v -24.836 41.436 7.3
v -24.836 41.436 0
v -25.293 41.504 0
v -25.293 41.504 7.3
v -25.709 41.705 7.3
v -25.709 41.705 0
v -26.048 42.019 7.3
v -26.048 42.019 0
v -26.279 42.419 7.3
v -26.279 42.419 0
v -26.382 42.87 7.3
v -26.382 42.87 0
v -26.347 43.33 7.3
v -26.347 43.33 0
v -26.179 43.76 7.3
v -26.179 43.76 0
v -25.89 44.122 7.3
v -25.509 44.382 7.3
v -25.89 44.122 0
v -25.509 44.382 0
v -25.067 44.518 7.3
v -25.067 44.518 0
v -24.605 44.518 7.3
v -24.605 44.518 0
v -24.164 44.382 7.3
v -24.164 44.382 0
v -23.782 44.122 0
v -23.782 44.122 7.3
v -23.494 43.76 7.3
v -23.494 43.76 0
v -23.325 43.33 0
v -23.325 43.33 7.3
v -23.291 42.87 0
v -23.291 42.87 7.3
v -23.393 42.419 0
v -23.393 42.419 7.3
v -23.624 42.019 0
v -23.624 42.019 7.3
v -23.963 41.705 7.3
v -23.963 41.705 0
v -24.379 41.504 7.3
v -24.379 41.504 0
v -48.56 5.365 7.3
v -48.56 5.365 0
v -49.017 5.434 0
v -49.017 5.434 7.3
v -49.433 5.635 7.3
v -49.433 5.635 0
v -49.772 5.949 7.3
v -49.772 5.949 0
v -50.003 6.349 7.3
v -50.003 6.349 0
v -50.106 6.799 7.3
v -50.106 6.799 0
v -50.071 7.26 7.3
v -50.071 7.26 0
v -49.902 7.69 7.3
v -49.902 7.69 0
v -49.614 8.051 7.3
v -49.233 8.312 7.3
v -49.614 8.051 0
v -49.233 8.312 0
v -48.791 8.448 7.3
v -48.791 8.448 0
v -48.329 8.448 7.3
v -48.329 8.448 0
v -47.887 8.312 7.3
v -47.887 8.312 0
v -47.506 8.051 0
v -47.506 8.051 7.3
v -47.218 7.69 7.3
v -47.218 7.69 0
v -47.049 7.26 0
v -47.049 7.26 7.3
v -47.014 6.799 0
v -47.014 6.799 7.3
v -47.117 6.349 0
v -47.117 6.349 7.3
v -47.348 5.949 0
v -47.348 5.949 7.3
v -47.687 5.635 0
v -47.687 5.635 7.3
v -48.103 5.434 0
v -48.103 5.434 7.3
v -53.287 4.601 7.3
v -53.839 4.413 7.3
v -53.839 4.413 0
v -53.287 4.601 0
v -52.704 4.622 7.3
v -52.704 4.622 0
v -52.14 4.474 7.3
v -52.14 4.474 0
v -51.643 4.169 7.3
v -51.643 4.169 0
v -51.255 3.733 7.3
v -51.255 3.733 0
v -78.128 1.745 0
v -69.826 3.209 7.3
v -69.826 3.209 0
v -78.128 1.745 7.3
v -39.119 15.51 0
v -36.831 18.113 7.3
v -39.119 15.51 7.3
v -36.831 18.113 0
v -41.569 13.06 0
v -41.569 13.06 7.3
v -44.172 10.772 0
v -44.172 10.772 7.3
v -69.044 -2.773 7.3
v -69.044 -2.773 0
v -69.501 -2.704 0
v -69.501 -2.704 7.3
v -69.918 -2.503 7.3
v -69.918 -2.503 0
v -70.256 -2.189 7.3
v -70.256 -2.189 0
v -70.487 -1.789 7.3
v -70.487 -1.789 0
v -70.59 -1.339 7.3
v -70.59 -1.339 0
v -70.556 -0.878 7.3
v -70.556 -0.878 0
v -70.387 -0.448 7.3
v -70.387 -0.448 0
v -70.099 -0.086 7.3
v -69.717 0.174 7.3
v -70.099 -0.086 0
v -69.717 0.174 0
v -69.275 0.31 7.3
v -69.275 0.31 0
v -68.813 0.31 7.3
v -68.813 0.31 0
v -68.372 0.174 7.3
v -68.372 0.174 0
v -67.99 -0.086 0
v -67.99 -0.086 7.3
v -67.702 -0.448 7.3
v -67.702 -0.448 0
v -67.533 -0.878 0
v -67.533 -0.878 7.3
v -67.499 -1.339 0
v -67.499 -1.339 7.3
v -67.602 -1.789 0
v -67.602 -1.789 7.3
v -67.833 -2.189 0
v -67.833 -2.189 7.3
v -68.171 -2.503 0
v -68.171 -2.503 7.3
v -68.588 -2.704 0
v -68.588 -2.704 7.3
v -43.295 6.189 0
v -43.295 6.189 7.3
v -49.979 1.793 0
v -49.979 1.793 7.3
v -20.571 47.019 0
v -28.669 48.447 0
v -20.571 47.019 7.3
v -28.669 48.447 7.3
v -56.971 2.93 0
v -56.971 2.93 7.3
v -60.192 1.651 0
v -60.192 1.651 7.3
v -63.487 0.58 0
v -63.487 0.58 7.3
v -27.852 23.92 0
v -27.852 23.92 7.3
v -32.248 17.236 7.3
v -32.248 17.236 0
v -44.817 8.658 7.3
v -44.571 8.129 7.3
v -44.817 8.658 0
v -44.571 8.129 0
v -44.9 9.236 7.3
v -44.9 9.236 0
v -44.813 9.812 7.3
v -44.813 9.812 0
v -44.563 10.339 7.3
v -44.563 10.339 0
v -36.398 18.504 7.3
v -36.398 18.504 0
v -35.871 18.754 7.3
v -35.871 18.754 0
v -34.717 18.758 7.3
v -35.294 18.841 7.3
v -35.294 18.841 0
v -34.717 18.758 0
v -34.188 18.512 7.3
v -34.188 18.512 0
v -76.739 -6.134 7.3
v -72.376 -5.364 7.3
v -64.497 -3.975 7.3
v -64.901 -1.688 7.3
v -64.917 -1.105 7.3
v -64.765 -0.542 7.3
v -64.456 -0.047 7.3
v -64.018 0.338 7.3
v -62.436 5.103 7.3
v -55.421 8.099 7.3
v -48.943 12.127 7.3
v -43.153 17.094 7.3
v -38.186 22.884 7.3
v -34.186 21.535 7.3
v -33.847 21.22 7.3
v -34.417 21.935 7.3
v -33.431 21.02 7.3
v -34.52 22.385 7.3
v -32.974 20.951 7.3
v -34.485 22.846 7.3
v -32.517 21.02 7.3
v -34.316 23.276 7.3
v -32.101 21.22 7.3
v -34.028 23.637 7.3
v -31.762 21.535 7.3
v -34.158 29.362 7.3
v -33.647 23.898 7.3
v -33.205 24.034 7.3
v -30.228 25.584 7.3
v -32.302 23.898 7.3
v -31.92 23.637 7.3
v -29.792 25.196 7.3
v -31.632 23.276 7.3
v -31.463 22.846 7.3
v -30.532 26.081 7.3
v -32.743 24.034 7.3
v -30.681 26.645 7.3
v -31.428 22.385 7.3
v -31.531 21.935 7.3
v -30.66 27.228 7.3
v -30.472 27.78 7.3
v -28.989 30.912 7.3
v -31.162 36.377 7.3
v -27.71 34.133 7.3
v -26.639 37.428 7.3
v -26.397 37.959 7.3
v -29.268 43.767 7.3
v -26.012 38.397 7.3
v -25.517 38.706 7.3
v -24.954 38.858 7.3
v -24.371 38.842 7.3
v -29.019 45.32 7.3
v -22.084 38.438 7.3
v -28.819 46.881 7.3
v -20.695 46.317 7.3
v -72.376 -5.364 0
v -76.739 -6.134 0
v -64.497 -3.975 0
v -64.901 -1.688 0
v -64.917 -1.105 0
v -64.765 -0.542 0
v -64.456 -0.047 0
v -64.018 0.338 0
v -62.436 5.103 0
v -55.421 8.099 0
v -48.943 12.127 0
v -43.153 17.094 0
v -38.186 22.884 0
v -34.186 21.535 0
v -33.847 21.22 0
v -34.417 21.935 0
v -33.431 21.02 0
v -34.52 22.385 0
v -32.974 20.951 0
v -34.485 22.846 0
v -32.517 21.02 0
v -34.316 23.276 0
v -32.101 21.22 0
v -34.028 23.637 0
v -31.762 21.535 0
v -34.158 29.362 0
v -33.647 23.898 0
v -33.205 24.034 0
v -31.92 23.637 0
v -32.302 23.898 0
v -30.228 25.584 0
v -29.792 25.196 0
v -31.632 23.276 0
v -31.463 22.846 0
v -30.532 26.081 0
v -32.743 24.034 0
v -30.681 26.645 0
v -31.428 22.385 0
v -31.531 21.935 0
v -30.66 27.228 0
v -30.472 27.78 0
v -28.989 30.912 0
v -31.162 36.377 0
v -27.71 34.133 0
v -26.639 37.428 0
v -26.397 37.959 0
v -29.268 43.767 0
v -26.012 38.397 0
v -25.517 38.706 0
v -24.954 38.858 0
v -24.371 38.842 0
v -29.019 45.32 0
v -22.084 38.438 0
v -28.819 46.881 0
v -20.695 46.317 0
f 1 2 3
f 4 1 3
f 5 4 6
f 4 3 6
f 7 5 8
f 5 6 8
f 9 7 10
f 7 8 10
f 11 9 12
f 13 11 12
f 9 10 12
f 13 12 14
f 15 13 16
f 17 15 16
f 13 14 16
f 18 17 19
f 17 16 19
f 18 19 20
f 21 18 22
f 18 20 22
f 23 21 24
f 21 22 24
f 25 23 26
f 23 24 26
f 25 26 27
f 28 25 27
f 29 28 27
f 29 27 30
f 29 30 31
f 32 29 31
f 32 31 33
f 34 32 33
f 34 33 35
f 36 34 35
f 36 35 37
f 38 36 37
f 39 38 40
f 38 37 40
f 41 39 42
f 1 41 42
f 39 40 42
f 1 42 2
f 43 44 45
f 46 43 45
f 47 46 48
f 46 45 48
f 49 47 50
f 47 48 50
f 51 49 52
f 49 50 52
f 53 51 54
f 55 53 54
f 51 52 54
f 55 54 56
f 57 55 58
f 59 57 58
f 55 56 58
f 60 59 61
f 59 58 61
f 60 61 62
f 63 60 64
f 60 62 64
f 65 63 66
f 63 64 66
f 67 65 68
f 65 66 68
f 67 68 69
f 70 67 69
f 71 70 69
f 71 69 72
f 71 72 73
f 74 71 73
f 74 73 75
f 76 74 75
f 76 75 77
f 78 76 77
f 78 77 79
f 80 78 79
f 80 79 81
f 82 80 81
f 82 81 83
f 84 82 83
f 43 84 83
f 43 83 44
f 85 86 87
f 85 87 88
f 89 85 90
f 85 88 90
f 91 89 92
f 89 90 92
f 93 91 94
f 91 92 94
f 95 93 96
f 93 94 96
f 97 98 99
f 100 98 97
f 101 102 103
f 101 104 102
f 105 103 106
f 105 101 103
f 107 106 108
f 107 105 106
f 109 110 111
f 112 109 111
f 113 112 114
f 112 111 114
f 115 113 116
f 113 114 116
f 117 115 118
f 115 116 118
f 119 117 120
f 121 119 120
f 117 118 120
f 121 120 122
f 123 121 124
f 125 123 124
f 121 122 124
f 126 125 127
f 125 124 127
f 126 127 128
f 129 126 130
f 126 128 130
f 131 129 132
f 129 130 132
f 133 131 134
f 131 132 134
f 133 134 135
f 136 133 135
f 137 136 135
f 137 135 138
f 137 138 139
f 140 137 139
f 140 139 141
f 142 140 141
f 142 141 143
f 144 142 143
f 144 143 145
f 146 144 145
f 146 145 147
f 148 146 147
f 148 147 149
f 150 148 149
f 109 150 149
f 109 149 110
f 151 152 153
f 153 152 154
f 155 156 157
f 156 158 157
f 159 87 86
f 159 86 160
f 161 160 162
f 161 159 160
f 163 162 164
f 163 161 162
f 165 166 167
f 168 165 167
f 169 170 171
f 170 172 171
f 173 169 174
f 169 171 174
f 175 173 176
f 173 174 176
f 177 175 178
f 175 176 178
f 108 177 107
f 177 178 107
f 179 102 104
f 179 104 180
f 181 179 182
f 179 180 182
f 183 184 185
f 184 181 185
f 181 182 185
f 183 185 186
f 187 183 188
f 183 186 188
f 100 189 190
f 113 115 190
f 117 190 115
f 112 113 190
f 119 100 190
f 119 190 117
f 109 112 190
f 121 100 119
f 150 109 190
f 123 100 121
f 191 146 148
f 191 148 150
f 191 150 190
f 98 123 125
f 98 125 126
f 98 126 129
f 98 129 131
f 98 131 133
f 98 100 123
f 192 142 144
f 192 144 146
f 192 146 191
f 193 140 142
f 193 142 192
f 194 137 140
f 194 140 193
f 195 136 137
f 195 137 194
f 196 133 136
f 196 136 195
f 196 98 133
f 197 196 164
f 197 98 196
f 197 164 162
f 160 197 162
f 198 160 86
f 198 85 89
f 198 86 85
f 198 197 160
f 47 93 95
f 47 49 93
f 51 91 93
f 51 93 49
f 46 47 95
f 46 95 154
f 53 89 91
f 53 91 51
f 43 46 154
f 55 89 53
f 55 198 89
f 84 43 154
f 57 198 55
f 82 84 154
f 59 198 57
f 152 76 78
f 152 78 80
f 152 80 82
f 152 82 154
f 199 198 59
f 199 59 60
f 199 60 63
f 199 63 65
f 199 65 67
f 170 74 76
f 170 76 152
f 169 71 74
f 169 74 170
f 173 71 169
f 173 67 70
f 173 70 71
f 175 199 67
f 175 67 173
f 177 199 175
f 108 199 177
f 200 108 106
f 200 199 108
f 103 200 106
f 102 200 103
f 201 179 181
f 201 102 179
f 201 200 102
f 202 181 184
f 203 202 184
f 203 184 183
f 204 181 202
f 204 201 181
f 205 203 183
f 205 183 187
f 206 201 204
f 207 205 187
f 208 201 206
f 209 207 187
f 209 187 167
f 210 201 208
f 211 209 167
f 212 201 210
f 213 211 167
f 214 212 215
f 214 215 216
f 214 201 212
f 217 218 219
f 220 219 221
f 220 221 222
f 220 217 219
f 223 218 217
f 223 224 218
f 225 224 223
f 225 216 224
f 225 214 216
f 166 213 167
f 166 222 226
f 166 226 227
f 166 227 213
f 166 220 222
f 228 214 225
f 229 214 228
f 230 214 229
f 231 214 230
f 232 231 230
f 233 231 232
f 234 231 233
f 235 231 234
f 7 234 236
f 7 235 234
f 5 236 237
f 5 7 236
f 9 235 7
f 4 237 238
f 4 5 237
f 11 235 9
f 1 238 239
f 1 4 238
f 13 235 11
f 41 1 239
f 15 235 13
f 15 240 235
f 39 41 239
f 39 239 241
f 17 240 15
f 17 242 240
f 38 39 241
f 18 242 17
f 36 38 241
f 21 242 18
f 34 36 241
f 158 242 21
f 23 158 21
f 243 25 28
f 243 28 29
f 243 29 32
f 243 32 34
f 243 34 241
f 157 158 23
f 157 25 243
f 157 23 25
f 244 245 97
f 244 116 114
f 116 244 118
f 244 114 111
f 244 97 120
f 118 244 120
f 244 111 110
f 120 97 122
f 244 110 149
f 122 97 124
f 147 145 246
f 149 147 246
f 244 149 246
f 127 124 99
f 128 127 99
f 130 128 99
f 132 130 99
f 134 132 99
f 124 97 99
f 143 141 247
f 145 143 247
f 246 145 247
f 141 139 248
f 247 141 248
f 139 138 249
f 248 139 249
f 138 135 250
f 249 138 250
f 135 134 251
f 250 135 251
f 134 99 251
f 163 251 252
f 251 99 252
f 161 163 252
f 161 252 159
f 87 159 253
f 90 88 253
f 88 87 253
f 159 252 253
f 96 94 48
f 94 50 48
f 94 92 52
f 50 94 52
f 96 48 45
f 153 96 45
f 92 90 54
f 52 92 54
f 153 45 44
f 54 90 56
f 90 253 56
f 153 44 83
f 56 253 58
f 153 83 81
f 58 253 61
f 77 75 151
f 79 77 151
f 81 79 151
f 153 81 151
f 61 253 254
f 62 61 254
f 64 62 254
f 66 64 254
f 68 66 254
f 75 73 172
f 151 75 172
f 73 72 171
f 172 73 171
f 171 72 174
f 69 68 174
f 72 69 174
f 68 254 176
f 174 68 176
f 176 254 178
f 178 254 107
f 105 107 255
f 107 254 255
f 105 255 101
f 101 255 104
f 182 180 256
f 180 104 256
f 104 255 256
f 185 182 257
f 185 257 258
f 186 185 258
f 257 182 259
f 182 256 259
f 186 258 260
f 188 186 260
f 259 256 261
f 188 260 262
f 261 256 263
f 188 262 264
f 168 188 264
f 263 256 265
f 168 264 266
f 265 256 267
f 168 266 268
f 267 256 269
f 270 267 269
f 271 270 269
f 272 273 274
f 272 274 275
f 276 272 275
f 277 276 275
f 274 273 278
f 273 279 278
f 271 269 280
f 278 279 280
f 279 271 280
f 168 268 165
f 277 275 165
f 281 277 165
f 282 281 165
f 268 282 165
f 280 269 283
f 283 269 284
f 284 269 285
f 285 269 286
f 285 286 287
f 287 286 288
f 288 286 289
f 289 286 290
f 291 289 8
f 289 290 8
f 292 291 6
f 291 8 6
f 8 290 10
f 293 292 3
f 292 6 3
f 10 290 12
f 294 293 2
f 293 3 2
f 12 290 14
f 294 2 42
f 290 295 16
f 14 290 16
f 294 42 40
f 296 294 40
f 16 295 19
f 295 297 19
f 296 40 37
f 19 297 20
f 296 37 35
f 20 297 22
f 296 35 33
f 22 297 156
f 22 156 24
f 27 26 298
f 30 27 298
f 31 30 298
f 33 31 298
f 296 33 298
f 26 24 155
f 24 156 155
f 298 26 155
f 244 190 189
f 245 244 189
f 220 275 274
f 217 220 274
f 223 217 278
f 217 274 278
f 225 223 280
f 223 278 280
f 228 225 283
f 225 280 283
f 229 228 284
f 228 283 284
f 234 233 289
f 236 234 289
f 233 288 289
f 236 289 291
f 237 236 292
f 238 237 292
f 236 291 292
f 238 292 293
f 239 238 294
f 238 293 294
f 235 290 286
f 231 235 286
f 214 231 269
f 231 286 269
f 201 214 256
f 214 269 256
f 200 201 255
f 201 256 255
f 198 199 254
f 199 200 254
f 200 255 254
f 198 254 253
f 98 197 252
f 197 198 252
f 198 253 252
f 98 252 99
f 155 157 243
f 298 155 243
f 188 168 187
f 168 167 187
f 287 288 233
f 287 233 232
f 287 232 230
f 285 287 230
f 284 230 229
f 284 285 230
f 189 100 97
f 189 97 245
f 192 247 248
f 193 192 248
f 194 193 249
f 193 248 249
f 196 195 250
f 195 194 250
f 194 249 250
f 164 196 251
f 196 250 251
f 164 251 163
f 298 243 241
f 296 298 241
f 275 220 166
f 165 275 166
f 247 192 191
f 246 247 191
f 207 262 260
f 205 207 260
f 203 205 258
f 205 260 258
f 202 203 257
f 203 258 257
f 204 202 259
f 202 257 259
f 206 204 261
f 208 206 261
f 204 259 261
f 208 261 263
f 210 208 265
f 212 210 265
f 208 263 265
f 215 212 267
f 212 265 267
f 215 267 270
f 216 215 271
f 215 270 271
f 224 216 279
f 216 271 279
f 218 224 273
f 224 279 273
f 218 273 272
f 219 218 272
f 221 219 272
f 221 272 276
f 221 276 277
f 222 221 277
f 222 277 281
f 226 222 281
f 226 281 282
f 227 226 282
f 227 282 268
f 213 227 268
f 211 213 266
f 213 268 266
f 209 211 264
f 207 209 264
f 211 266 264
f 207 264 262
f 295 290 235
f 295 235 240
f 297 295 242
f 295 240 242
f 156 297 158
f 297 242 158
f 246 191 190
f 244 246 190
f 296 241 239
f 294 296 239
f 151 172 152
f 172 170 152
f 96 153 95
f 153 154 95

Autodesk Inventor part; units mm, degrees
ref_plane "YZ Plane" through (0, 0, 0) normal (1, 0, 0) x (0, 1, 0)
ref_plane "XZ Plane" through (0, 0, 0) normal (0, 1, 0) x (-1, 0, 0)
ref_plane "XY Plane" through (0, 0, 0) normal (0, 0, 1) x (1, 0, 0)
sketch "Sketch1" plane through (0, 0, 0) normal (0, 0, 1) x (1, 0, 0)
  circle A0 centre (-48.56, 6.9152) radius 2.1 projected
  circle A1 centre (-32.9741, 22.501) radius 2.1 projected
  circle A2 centre (-69.0444, -1.2227) radius 2.1 projected
  circle A3 centre (-24.8362, 42.9855) radius 2.1 projected
  circle A4 centre (-46.3856, -8.3913) radius 8 projected
  line L0 (-28.6687, 48.4472) -> (-17.4995, 54.7179) projected
  arc A5 (-69.8258, 3.2089) -> (-28.6687, 48.4472) centre (-78.5082, 52.4493) ccw projected
  line L1 (-69.8258, 3.2089) -> (-78.128, 1.745) projected
  line L2 (-78.128, 1.745) -> (-74.0482, -21.3924) projected
  line L3 (-74.0482, -21.3924) -> (-70.3922, -20.7477) projected
  arc A6 (-70.3922, -20.7477) -> (-49.7861, -35.1763) centre (-46.3856, -8.3913) ccw projected
  line L4 (-49.7861, -35.1763) -> (-49.1414, -38.8323) projected
  line L5 (-49.1414, -38.8323) -> (-41.263, -37.4431) projected
  line L6 (-41.263, -37.4431) -> (4.3164, -53.3072) projected
  line L7 (4.3164, -53.3072) -> (1.8974, -59.9532) projected
  line L8 (1.8974, -59.9532) -> (17.5702, -63.2237) projected
  arc A7 (17.5702, -63.2237) -> (22.7521, -63.408) centre (22.2724, -3.9734) ccw projected
  line L9 (22.7521, -63.408) -> (22.7442, -62.4373) projected
  arc A8 (24.6597, -60.4229) -> (22.7442, -62.4373) centre (24.7442, -62.4211) ccw projected
  arc A9 (24.6597, -60.4229) -> (33.3265, -59.3815) centre (22.2724, -3.9734) ccw projected
  arc A10 (35.6646, -60.8847) -> (33.3265, -59.3815) centre (33.7178, -61.3428) ccw projected
  line L10 (35.6646, -60.8847) -> (35.9706, -62.1851) projected
  arc A11 (35.9706, -62.1851) -> (41.9803, -60.4344) centre (22.2724, -3.9734) ccw projected
  line L11 (41.9803, -60.4344) -> (52.856, -55.363) projected
  arc A12 (52.856, -55.363) -> (58.0602, -51.8846) centre (22.2724, -3.9734) ccw projected
  line L12 (58.0602, -51.8846) -> (57.2607, -50.8143) projected
  arc A13 (57.6121, -48.0569) -> (57.2607, -50.8143) centre (58.863, -49.6174) ccw projected
  arc A14 (57.6121, -48.0569) -> (63.9808, -42.0872) centre (22.2724, -3.9734) ccw projected
  arc A15 (66.7551, -41.9147) -> (63.9808, -42.0872) centre (65.4572, -43.4363) ccw projected
  line L13 (66.7551, -41.9147) -> (67.4937, -42.5447) projected
  arc A16 (67.4937, -42.5447) -> (70.6833, -38.4566) centre (22.2724, -3.9734) ccw projected
  line L14 (70.6833, -38.4566) -> (78.2523, -24.3484) projected
  line L15 (78.2523, -24.3484) -> (71.6063, -21.9294) projected
  arc A17 (71.6063, -21.9294) -> (67.7387, 22.2766) centre (22.2724, -3.9734) ccw projected
  line L16 (67.7387, 22.2766) -> (73.8637, 25.8129) projected
  line L17 (73.8637, 25.8129) -> (63.9599, 38.3925) projected
  arc A18 (63.9599, 38.3925) -> (60.1088, 41.8646) centre (22.2724, -3.9734) ccw projected
  line L18 (60.1088, 41.8646) -> (59.4908, 41.1159) projected
  arc A19 (56.7287, 40.804) -> (59.4908, 41.1159) centre (57.9484, 42.389) ccw projected
  arc A20 (56.7287, 40.804) -> (49.4201, 45.5771) centre (22.2724, -3.9734) ccw projected
  arc A21 (48.5953, 48.2316) -> (49.4201, 45.5771) centre (50.3811, 47.3311) ccw projected
  line L19 (48.5953, 48.2316) -> (49.1968, 49.4245) projected
  arc A22 (49.1968, 49.4245) -> (43.4677, 51.9463) centre (22.2724, -3.9734) ccw projected
  line L20 (43.4677, 51.9463) -> (31.8766, 55.0521) projected
  arc A23 (31.8766, 55.0521) -> (25.6541, 55.7327) centre (22.2724, -3.9734) ccw projected
  line L21 (25.6541, 55.7327) -> (25.5786, 54.3989) projected
  arc A24 (23.537, 52.5125) -> (25.5786, 54.3989) centre (23.5818, 54.512) ccw projected
  arc A25 (23.537, 52.5125) -> (14.821, 52.0331) centre (22.2724, -3.9734) ccw projected
  arc A26 (12.5849, 53.6843) -> (14.821, 52.0331) centre (14.5573, 54.0157) ccw projected
  line L22 (12.5849, 53.6843) -> (12.4241, 54.6417) projected
  arc A27 (12.4241, 54.6417) -> (7.3529, 53.5603) centre (22.2724, -3.9734) ccw projected
  line L23 (7.3529, 53.5603) -> (-7.5139, 47.618) projected
  line L24 (-7.5139, 47.618) -> (-17.4995, 54.7179) projected
  circle A28 centre (-71.296, -16.8454) radius 1.5 projected
  circle A29 centre (18.8152, -59.8032) radius 1.5 projected
  circle A30 centre (53.4562, -50.8504) radius 1.5 projected
  circle A31 centre (60.8075, 36.5725) radius 1.5 projected
  circle A32 centre (28.5162, 51.9811) radius 1.5 projected
  circle A33 centre (9.173, 50.4079) radius 1.5 projected
  circle A34 centre (44.8423, 47.6065) radius 1.5 projected
  circle A35 centre (67.2628, -37.2117) radius 1.5 projected
  circle A36 centre (38.1378, -57.9935) radius 1.5 projected
  circle A37 centre (-45.81, -34.6909) radius 1.5 projected
  circle A38 centre (22.2724, -3.9734) radius 32.5 projected
  circle A39 centre (-78.5082, 52.4493) radius 5.9 projected
  circle A40 centre (-78.5082, 52.4493) radius 50
  circle A41 centre (-78.5082, 52.4493) radius 54
  line L25 (-78.5082, 52.4493) -> (-69.0444, -1.2227)
  line L26 (-78.5082, 52.4493) -> (-24.8362, 42.9855)
  point P0 (0, 0)
  point P1 (-25.3286, 43.0723)
  point P2 (-29.2678, 43.7669)
  point P3 (-69.1312, -0.7303)
  dimension "d0" = 100
  dimension "d1" = 108
extrude "Extrusion1" add sketch "Sketch1" along normal blind 7.3 contours A41 A0 | A0 A41 A2 L25 A5 L26 A3 A1 | A1 A41 | A41 L25 A2 | A3 L26 A41 picked at (-49.1962, 7.731) picked at (-33.8814, 22.9981) picked at (-68.8495, -0.1546) picked at (-25.9043, 42.7906)
sketch "Sketch2" plane through (0, 0, 7.3) normal (0, 0, 1) x (1, 0, 0)
  circle A0 centre (-48.56, 6.9152) radius 2.1 projected
  circle A1 centre (-32.9741, 22.501) radius 2.1 projected
  circle A2 centre (-69.0444, -1.2227) radius 2.1 projected
  circle A3 centre (-24.8362, 42.9855) radius 2.1 projected
  circle A4 centre (-46.3856, -8.3913) radius 8 projected
  line L0 (-28.6687, 48.4472) -> (-17.4995, 54.7179) projected
  arc A5 (-69.8258, 3.2089) -> (-28.6687, 48.4472) centre (-78.5082, 52.4493) ccw projected
  line L1 (-69.8258, 3.2089) -> (-78.128, 1.745) projected
  line L2 (-78.128, 1.745) -> (-74.0482, -21.3924) projected
  line L3 (-74.0482, -21.3924) -> (-70.3922, -20.7477) projected
  arc A6 (-70.3922, -20.7477) -> (-49.7861, -35.1763) centre (-46.3856, -8.3913) ccw projected
  line L4 (-49.7861, -35.1763) -> (-49.1414, -38.8323) projected
  line L5 (-49.1414, -38.8323) -> (-41.263, -37.4431) projected
  line L6 (-41.263, -37.4431) -> (4.3164, -53.3072) projected
  line L7 (4.3164, -53.3072) -> (1.8974, -59.9532) projected
  line L8 (1.8974, -59.9532) -> (17.5702, -63.2237) projected
  arc A7 (17.5702, -63.2237) -> (22.7521, -63.408) centre (22.2724, -3.9734) ccw projected
  line L9 (22.7521, -63.408) -> (22.7442, -62.4373) projected
  arc A8 (24.6597, -60.4229) -> (22.7442, -62.4373) centre (24.7442, -62.4211) ccw projected
  arc A9 (24.6597, -60.4229) -> (33.3265, -59.3815) centre (22.2724, -3.9734) ccw projected
  arc A10 (35.6646, -60.8847) -> (33.3265, -59.3815) centre (33.7178, -61.3428) ccw projected
  line L10 (35.6646, -60.8847) -> (35.9706, -62.1851) projected
  arc A11 (35.9706, -62.1851) -> (41.9803, -60.4344) centre (22.2724, -3.9734) ccw projected
  line L11 (41.9803, -60.4344) -> (52.856, -55.363) projected
  arc A12 (52.856, -55.363) -> (58.0602, -51.8846) centre (22.2724, -3.9734) ccw projected
  line L12 (58.0602, -51.8846) -> (57.2607, -50.8143) projected
  arc A13 (57.6121, -48.0569) -> (57.2607, -50.8143) centre (58.863, -49.6174) ccw projected
  arc A14 (57.6121, -48.0569) -> (63.9808, -42.0872) centre (22.2724, -3.9734) ccw projected
  arc A15 (66.7551, -41.9147) -> (63.9808, -42.0872) centre (65.4572, -43.4363) ccw projected
  line L13 (66.7551, -41.9147) -> (67.4937, -42.5447) projected
  arc A16 (67.4937, -42.5447) -> (70.6833, -38.4566) centre (22.2724, -3.9734) ccw projected
  line L14 (70.6833, -38.4566) -> (78.2523, -24.3484) projected
  line L15 (78.2523, -24.3484) -> (71.6063, -21.9294) projected
  arc A17 (71.6063, -21.9294) -> (67.7387, 22.2766) centre (22.2724, -3.9734) ccw projected
  line L16 (67.7387, 22.2766) -> (73.8637, 25.8129) projected
  line L17 (73.8637, 25.8129) -> (63.9599, 38.3925) projected
  arc A18 (63.9599, 38.3925) -> (60.1088, 41.8646) centre (22.2724, -3.9734) ccw projected
  line L18 (60.1088, 41.8646) -> (59.4908, 41.1159) projected
  arc A19 (56.7287, 40.804) -> (59.4908, 41.1159) centre (57.9484, 42.389) ccw projected
  arc A20 (56.7287, 40.804) -> (49.4201, 45.5771) centre (22.2724, -3.9734) ccw projected
  arc A21 (48.5953, 48.2316) -> (49.4201, 45.5771) centre (50.3811, 47.3311) ccw projected
  line L19 (48.5953, 48.2316) -> (49.1968, 49.4245) projected
  arc A22 (49.1968, 49.4245) -> (43.4677, 51.9463) centre (22.2724, -3.9734) ccw projected
  line L20 (43.4677, 51.9463) -> (31.8766, 55.0521) projected
  arc A23 (31.8766, 55.0521) -> (25.6541, 55.7327) centre (22.2724, -3.9734) ccw projected
  line L21 (25.6541, 55.7327) -> (25.5786, 54.3989) projected
  arc A24 (23.537, 52.5125) -> (25.5786, 54.3989) centre (23.5818, 54.512) ccw projected
  arc A25 (23.537, 52.5125) -> (14.821, 52.0331) centre (22.2724, -3.9734) ccw projected
  arc A26 (12.5849, 53.6843) -> (14.821, 52.0331) centre (14.5573, 54.0157) ccw projected
  line L22 (12.5849, 53.6843) -> (12.4241, 54.6417) projected
  arc A27 (12.4241, 54.6417) -> (7.3529, 53.5603) centre (22.2724, -3.9734) ccw projected
  line L23 (7.3529, 53.5603) -> (-7.5139, 47.618) projected
  line L24 (-7.5139, 47.618) -> (-17.4995, 54.7179) projected
  circle A28 centre (-71.296, -16.8454) radius 1.5 projected
  circle A29 centre (18.8152, -59.8032) radius 1.5 projected
  circle A30 centre (53.4562, -50.8504) radius 1.5 projected
  circle A31 centre (60.8075, 36.5725) radius 1.5 projected
  circle A32 centre (28.5162, 51.9811) radius 1.5 projected
  circle A33 centre (9.173, 50.4079) radius 1.5 projected
  circle A34 centre (44.8423, 47.6065) radius 1.5 projected
  circle A35 centre (67.2628, -37.2117) radius 1.5 projected
  circle A36 centre (38.1378, -57.9935) radius 1.5 projected
  circle A37 centre (-45.81, -34.6909) radius 1.5 projected
  circle A38 centre (22.2724, -3.9734) radius 32.5 projected
  line L25 (-78.5082, 52.4493) -> (-69.0444, -1.2227)
  line L26 (-64.4974, -3.975) -> (-72.3759, -5.3642)
  line L27 (-72.3759, -5.3642) -> (-73.5914, 1.5295)
  line L28 (-73.5914, 1.5295) -> (-65.7129, 2.9187)
  line L29 (-65.7129, 2.9187) -> (-64.4974, -3.975)
  line L30 (-64.4974, -3.975) -> (-73.5914, 1.5295) construction
  line L31 (-72.3759, -5.3642) -> (-65.7129, 2.9187) construction
  line L32 (-43.2948, 6.189) -> (-49.9787, 1.793)
  line L33 (-47.1413, 12.0374) -> (-43.2948, 6.189)
  line L34 (-53.8252, 7.6414) -> (-47.1413, 12.0374)
  line L35 (-49.9787, 1.793) -> (-53.8252, 7.6414)
  line L36 (-27.8519, 23.9197) -> (-32.248, 17.2358)
  line L37 (-33.7003, 27.7663) -> (-27.8519, 23.9197)
  line L38 (-38.0964, 21.0824) -> (-33.7003, 27.7663)
  line L39 (-32.248, 17.2358) -> (-38.0964, 21.0824)
  line L40 (-20.6948, 46.3169) -> (-22.084, 38.4385)
  line L41 (-27.5884, 47.5325) -> (-20.6948, 46.3169)
  line L42 (-28.9776, 39.654) -> (-27.5884, 47.5325)
  line L43 (-22.084, 38.4385) -> (-28.9776, 39.654)
  line L44 (-72.3759, -5.3642) -> (-76.7388, -6.1335)
  line L45 (-28.6687, 48.4472) -> (-20.5709, 47.0193)
  line L46 (-20.5709, 47.0193) -> (-20.6948, 46.3169)
  line L47 (-25.3286, 43.0723) -> (-29.2678, 43.7669) projected
  point P0 (0, 0)
  point P1 (-69.6522, 2.2241)
  point P2 (-28.283, 43.5932)
  dimension "d4" = 8
  dimension "d5" = 7
  dimension "d8" = 70
extrude "Extrusion2" add sketch "Sketch2" against normal blind 7.3 contours A0 | A1 | A2 | L28 L29 L26 L27 | L28 L27 L44 L2 L1 L25 | A5 L45 L46 L41 L42 L47 | L42 L41 L40 L43 | A3 | L32 L35 L34 L33 | L36 L39 L38 L37
sketch "Sketch3" plane through (0, 0, 7.3) normal (0, 0, 1) x (1, 0, 0)
  circle A0 centre (-24.8362, 42.9855) radius 2.1 projected
  circle A1 centre (-32.9741, 22.501) radius 2.1 projected
  circle A2 centre (-48.56, 6.9152) radius 2.1 projected
  circle A3 centre (-69.0444, -1.2227) radius 2.1 projected
  point P0 (0, 0)
hole "Hole1" at (-24.8362, 42.9855, 7.3) at (-32.9741, 22.501, 7.3) at (-48.56, 6.9152, 7.3) at (-69.0444, -1.2227, 7.3) direction (0, 0, -1) diameter 3.1 depth 17
fillet "Fillet1" radius 2 6 edges at (-65.2178, 0.1104, 3.65) (-52.2582, 5.2588, 3.65) (-45.5743, 9.6549, 3.65) (-35.7139, 19.5154, 3.65) (-31.3178, 26.1993, 3.65) (-26.1693, 39.1588, 3.65)
properties part number "shell_5" material "ABS Plastic"
